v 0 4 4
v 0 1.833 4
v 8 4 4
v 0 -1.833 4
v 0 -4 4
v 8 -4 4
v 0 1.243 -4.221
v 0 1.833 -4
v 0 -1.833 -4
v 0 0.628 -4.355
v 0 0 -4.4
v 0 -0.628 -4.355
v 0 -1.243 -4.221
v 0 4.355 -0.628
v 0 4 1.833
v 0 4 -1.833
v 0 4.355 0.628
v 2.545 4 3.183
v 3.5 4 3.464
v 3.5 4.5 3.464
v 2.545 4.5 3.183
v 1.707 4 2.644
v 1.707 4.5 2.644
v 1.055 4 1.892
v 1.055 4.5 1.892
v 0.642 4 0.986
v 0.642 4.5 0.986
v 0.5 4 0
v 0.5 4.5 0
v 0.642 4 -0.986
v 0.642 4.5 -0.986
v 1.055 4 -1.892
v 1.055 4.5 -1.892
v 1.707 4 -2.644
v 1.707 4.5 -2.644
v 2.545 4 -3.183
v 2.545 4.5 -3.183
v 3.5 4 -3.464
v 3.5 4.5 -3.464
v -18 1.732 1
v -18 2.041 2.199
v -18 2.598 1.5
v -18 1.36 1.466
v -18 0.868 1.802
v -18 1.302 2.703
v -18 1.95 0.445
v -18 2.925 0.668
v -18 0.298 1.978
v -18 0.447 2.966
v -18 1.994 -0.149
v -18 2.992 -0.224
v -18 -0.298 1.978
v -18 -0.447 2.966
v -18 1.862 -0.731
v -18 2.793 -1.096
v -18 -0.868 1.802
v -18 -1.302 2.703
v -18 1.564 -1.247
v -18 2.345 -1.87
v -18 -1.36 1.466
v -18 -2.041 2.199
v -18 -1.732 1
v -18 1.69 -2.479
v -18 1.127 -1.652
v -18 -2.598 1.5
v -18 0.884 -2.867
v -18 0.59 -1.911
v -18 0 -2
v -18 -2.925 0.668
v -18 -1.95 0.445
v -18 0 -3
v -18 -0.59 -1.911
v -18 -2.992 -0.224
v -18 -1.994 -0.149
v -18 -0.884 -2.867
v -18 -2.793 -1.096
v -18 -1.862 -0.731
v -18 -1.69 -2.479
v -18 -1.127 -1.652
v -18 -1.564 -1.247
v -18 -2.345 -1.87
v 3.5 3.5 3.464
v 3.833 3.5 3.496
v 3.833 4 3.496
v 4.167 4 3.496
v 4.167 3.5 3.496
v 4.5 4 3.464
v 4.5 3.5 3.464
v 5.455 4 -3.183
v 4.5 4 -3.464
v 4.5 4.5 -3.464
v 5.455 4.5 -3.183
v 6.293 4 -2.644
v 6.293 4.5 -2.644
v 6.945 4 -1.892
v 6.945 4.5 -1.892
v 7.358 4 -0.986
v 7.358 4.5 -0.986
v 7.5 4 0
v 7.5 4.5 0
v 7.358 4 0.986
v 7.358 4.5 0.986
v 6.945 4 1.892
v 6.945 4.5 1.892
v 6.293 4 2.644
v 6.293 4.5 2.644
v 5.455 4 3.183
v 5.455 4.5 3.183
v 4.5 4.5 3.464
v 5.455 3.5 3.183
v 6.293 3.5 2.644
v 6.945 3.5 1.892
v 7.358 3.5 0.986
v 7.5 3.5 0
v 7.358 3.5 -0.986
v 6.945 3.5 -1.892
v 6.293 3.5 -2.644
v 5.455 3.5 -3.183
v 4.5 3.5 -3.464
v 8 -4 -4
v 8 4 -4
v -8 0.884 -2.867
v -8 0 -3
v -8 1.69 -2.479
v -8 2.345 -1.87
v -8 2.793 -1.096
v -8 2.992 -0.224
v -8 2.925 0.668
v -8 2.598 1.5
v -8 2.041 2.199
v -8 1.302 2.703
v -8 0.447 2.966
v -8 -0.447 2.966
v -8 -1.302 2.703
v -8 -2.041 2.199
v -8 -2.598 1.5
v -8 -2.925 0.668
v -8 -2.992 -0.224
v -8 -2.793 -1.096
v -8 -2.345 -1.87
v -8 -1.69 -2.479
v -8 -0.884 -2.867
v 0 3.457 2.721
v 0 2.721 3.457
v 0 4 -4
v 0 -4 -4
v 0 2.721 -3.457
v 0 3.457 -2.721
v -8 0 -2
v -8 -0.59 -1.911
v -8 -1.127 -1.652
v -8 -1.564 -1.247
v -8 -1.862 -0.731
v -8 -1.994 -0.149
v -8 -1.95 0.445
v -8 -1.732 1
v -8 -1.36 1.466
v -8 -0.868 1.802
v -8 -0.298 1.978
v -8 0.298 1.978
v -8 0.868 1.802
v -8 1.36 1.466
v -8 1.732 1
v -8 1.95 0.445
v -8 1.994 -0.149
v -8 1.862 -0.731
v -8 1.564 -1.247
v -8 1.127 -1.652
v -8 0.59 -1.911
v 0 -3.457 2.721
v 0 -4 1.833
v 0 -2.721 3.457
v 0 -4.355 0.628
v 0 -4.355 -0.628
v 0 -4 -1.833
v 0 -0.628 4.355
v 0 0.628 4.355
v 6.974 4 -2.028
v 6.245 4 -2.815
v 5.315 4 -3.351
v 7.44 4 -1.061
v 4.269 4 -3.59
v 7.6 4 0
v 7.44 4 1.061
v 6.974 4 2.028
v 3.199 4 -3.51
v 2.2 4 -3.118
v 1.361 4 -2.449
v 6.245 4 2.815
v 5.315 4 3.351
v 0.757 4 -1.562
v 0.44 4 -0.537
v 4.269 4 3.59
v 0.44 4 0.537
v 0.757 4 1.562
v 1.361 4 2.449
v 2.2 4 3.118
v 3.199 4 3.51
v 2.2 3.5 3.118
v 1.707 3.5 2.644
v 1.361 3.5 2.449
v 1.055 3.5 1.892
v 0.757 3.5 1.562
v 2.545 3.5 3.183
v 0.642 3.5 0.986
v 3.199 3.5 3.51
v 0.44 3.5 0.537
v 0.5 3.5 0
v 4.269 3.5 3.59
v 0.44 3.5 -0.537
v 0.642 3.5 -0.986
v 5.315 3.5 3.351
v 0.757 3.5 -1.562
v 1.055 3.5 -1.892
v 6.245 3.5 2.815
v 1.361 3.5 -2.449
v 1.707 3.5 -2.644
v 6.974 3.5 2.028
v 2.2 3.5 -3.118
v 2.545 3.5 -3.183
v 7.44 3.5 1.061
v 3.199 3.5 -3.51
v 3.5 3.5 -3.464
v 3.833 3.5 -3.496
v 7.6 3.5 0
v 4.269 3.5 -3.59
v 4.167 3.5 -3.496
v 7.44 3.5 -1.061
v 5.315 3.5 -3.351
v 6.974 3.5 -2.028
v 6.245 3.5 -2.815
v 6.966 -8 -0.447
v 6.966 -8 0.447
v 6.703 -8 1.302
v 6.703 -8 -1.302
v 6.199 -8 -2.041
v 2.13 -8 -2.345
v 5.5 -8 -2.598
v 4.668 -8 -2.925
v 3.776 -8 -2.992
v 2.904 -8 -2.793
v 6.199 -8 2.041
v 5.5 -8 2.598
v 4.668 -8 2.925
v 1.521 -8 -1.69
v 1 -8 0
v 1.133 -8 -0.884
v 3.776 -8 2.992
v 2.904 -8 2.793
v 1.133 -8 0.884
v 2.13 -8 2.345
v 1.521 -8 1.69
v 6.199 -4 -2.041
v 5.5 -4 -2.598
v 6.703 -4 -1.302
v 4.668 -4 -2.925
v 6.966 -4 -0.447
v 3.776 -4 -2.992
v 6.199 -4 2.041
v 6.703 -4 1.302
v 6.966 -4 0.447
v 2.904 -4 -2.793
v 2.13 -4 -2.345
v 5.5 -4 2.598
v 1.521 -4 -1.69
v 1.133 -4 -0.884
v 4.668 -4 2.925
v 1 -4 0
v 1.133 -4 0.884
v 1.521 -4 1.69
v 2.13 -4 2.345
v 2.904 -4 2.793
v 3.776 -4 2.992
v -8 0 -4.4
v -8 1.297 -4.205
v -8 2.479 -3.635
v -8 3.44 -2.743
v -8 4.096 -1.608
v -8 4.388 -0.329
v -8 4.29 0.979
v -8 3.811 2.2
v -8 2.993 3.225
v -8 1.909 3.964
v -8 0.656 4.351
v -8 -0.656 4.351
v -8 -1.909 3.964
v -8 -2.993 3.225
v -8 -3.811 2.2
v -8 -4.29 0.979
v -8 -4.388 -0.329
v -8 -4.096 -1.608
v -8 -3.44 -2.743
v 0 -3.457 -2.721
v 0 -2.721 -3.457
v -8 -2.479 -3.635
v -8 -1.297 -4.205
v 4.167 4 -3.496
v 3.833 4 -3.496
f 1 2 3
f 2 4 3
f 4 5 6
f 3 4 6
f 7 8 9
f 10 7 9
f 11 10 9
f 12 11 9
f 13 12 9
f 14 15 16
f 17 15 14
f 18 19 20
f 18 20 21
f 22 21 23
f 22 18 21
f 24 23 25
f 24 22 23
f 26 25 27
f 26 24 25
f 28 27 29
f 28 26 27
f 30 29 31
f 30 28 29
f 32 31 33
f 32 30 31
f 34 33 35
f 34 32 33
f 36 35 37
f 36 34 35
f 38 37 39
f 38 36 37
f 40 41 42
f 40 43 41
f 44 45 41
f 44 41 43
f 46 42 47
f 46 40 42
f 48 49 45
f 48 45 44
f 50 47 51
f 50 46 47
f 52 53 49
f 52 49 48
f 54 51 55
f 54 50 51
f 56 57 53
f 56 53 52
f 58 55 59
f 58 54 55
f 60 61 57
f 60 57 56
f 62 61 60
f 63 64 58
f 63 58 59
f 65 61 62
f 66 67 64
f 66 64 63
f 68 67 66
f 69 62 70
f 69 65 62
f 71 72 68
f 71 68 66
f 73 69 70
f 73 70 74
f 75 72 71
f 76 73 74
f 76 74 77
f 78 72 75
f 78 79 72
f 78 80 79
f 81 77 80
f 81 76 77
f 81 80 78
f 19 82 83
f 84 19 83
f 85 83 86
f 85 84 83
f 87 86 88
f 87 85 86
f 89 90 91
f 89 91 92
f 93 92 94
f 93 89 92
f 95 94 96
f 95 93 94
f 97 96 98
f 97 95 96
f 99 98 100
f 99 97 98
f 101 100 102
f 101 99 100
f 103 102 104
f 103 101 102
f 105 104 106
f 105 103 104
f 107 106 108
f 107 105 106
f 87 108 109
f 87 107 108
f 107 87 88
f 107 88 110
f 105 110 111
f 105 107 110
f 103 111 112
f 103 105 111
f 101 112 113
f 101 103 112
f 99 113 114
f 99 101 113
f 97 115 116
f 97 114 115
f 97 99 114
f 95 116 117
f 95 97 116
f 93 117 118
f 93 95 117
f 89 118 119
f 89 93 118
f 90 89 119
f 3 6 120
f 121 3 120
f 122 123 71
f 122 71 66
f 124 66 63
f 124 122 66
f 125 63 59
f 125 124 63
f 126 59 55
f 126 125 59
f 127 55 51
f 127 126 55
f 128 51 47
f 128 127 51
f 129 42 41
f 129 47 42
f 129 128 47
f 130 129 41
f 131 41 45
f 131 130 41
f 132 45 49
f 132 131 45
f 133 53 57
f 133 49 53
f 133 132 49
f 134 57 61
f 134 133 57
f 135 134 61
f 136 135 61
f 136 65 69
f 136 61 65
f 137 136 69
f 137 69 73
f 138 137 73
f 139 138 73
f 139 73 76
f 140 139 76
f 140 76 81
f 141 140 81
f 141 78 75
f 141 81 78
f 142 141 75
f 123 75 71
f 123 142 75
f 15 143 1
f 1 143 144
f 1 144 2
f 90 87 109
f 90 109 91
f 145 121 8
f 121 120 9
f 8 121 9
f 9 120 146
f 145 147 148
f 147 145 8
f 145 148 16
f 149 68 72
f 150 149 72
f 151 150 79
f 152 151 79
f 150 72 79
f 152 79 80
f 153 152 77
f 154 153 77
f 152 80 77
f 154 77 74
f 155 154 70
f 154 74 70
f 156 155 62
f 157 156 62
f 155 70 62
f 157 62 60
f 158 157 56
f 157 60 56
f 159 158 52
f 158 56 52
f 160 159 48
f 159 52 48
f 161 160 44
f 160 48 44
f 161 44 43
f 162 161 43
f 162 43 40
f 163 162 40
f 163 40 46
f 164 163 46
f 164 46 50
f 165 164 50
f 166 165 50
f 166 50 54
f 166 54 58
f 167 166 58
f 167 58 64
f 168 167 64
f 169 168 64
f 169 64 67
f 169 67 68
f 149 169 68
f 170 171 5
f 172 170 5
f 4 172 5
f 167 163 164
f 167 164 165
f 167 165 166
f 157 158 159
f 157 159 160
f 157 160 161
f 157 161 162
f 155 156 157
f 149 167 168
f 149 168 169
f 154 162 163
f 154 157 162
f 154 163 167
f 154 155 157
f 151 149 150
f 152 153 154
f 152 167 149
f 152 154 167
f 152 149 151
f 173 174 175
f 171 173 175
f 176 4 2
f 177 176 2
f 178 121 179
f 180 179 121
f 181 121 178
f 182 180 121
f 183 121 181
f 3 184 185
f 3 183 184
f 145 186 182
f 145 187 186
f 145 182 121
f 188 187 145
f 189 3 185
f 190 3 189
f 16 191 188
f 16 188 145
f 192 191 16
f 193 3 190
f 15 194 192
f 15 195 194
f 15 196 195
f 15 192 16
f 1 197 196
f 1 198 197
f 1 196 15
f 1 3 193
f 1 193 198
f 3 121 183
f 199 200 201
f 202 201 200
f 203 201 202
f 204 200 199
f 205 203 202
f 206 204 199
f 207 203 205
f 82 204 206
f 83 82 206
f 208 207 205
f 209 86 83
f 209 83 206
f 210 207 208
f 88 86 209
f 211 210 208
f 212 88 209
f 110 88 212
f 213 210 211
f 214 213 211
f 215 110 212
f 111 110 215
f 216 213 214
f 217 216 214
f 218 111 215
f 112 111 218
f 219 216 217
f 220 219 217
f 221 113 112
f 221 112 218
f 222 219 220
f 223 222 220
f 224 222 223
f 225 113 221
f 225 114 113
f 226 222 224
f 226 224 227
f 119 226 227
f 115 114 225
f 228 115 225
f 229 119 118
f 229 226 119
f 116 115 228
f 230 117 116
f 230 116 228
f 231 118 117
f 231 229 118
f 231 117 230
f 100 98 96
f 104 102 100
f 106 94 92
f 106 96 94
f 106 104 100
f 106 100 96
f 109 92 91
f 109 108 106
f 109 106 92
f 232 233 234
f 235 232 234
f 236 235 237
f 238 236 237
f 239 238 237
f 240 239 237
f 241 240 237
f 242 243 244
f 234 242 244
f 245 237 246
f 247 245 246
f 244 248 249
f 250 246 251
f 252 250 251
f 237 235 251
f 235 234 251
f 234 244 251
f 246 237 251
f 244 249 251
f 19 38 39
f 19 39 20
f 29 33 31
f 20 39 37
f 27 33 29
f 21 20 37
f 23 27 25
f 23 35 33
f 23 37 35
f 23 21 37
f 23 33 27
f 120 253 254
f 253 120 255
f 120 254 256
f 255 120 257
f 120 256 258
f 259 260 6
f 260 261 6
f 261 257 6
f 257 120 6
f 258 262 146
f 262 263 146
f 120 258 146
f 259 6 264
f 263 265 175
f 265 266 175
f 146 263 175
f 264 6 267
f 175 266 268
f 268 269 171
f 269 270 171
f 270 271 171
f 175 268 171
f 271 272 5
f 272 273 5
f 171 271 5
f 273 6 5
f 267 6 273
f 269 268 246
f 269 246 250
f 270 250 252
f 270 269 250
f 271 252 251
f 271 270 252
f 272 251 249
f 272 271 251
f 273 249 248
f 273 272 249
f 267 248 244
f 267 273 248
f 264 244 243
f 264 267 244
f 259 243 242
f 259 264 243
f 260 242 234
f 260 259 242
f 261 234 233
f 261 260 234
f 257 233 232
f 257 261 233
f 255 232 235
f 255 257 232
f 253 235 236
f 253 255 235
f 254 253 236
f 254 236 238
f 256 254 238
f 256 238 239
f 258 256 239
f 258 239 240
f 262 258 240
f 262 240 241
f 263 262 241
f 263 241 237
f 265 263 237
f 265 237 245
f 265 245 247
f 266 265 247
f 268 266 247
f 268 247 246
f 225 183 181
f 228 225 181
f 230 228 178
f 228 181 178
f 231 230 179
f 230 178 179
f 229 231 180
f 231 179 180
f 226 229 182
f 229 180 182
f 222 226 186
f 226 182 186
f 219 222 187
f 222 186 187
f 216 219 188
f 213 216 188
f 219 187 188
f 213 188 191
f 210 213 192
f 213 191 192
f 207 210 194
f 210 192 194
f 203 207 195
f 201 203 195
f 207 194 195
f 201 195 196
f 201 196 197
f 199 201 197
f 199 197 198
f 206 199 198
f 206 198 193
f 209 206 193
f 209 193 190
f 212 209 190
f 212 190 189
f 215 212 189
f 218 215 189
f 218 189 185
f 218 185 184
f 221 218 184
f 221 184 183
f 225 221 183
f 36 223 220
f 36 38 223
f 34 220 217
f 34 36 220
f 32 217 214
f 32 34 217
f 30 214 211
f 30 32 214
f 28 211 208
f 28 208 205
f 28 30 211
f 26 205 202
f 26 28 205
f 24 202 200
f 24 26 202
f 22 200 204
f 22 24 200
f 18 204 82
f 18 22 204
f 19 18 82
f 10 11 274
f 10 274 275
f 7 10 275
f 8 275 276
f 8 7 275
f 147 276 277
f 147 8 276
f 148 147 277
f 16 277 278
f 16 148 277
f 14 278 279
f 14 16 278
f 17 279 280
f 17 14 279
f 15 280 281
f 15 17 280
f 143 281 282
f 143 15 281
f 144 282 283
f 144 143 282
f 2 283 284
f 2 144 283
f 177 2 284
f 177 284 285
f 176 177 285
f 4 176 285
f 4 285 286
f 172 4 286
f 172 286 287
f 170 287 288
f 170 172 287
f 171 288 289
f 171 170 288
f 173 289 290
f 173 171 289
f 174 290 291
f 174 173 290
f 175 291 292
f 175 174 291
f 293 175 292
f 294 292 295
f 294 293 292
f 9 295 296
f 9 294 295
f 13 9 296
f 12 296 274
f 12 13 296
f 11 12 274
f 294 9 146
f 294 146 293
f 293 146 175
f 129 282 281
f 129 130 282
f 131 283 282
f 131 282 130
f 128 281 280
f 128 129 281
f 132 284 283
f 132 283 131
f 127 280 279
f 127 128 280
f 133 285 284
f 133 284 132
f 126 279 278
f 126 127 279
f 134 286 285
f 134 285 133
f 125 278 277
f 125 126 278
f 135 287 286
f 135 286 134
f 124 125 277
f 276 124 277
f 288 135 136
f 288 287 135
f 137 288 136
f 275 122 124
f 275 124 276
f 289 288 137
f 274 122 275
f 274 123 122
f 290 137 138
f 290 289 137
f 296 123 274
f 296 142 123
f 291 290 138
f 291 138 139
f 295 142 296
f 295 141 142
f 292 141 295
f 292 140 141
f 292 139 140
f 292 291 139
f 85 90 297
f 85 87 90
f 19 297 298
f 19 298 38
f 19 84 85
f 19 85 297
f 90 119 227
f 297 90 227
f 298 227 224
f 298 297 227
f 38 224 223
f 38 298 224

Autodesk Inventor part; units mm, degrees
ref_plane "YZ Plane" through (0, 0, 0) normal (1, 0, 0) x (0, 1, 0)
ref_plane "XZ Plane" through (0, 0, 0) normal (0, 1, 0) x (-1, 0, 0)
ref_plane "XY Plane" through (0, 0, 0) normal (0, 0, 1) x (1, 0, 0)
sketch "Sketch1" plane through (0, 0, 0) normal (0, 1, 0) x (-1, 0, 0)
  line L0 (0, 0) -> (8, 0)
  line L1 (8, 0) -> (8, -4.4)
  line L2 (8, -4.4) -> (0, -4.4)
  line L3 (0, -4.4) -> (0, 0)
  line L4 (0, 0) -> (-8, 0)
  line L5 (-8, 0) -> (-8, -4)
  line L6 (-8, -4) -> (0, -4)
  line L7 (0, -4) -> (0, 0)
  line L8 (-8, 0) -> (0, 0)
  line L9 (0, 0) -> (0, 4)
  line L10 (0, 4) -> (-8, 4)
  line L11 (-8, 4) -> (-8, 0)
  circle A0 centre (-4, 0) radius 3
  line L12 (8, -2) -> (18, -2)
  line L13 (18, -2) -> (18, -3)
  line L14 (18, -3) -> (8, -3)
  line L15 (8, -3) -> (8, -2)
  circle A1 centre (-4, 0) radius 3.5
  line L16 (-3.5, 3.6063) -> (-4.5, 3.6063)
  line L17 (-4.5, 3.6063) -> (-4.5, -3.6063)
  line L18 (-4.5, -3.6063) -> (-3.5, -3.6063)
  line L19 (-3.5, -3.6063) -> (-3.5, 3.6063)
  line L20 (-3.5, 3.6063) -> (-4.5, -3.6063) construction
  line L21 (-4.5, 3.6063) -> (-3.5, -3.6063) construction
  point P0 (-4.5, 3.4641)
  point P1 (-4.5, -3.4641)
  point P2 (-3.5, -3.4641)
  point P3 (-3.5, 3.4641)
  dimension "d0" = 8
  dimension "d1" = 4.4
  dimension "d2" = 8
  dimension "d3" = 4
  dimension "d4" = 4
  dimension "d5" = 6
  dimension "d6" = 10
  dimension "d7" = 1
  dimension "d8" = 2
  dimension "d9" = 7
  dimension "d10" = 1
revolve "Revolution1" add sketch "Sketch1" angle 360 about axis through (0, 0, 0) along (-1, 0, 0) contours L0 L1 L2 L3
revolve "Revolution2" add sketch "Sketch1" angle 360 about axis through (0, 0, 0) along (-1, 0, 0) contours L12 L13 L14 L1
extrude "Extrusion1" add sketch "Sketch1" along normal mid plane 8 contours L3 L6 L5 L4 A1 L17 L18 L19 | L4 A1 L19 L16 L17 L11 L10 L9 | A1 L19 A0 L4 | L4 A0 L19 A1 | A0 L19 L4 | L4 L19 A0 | L19 A0 L17 A1 | A1 L17 L16 L19 | L19 L18 L17 A1 | A1 L17 A0 L19 | L19 A0 L17 L4 | L4 L17 A0 L19 | L17 A0 L4 A1 | A1 L4 A0 L17 | L17 A0 L4 | L4 A0 L17
extrude "Extrusion2" add sketch "Sketch1" against normal blind 8 contours A0 L19 L4 | L4 L19 A0 | L19 A0 L17 L4 | L4 L17 A0 L19 | L17 A0 L4 | L4 A0 L17
extrude "Extrusion3" add sketch "Sketch1" along normal blind 4.5 contours A1 L19 A0 L4 | L4 A0 L19 A1 | A0 L19 L4 | L4 L19 A0 | L17 A0 L4 A1 | A1 L4 A0 L17 | L17 A0 L4 | L4 A0 L17
sketch "Sketch2" plane through (0, 4, 0) normal (0, 1, 0) x (1, 0, 0)
  arc A0 (3.5, 3.4641) -> (3.5, -3.4641) centre (4, 0) ccw projected
  line L0 (3.5, -3.4641) -> (3.5, 3.4641) projected
  arc A1 (4.5, -3.4641) -> (4.5, 3.4641) centre (4, 0) ccw projected
  line L1 (4.5, 3.4641) -> (4.5, -3.4641) projected
  line L2 (4.5, -3.4641) -> (4.5, 3.4641) projected
  arc A2 (4.5, -3.4641) -> (4.5, 3.4641) centre (4, 0) ccw projected
  line L3 (3.5, 3.4641) -> (3.5, -3.4641) projected
  arc A3 (3.5, 3.4641) -> (3.5, -3.4641) centre (4, 0) ccw projected
  line L4 (0, -4) -> (8, -4) projected
  line L5 (8, -4) -> (8, 4) projected
  line L6 (8, 4) -> (0, 4) projected
  line L7 (0, 4) -> (0, 1.833) projected
  line L8 (0, -1.833) -> (0, 1.833) projected
  line L9 (0, -1.833) -> (0, -4) projected
  circle A4 centre (4, 0) radius 3.6
  circle A5 centre (4, 0) radius 3.5
  point P0 (0, 0)
  point P1 (3.5, -3.4641)
  dimension "d19" = 7.2
extrude "Extrusion4" cut sketch "Sketch2" against normal blind 0.5 contours A4
thread "Thread1" size "M6x1" class "6g" standard "ISO Metric profile" length 3.5 offset 0.5
properties part number "6mm hose fitting"
